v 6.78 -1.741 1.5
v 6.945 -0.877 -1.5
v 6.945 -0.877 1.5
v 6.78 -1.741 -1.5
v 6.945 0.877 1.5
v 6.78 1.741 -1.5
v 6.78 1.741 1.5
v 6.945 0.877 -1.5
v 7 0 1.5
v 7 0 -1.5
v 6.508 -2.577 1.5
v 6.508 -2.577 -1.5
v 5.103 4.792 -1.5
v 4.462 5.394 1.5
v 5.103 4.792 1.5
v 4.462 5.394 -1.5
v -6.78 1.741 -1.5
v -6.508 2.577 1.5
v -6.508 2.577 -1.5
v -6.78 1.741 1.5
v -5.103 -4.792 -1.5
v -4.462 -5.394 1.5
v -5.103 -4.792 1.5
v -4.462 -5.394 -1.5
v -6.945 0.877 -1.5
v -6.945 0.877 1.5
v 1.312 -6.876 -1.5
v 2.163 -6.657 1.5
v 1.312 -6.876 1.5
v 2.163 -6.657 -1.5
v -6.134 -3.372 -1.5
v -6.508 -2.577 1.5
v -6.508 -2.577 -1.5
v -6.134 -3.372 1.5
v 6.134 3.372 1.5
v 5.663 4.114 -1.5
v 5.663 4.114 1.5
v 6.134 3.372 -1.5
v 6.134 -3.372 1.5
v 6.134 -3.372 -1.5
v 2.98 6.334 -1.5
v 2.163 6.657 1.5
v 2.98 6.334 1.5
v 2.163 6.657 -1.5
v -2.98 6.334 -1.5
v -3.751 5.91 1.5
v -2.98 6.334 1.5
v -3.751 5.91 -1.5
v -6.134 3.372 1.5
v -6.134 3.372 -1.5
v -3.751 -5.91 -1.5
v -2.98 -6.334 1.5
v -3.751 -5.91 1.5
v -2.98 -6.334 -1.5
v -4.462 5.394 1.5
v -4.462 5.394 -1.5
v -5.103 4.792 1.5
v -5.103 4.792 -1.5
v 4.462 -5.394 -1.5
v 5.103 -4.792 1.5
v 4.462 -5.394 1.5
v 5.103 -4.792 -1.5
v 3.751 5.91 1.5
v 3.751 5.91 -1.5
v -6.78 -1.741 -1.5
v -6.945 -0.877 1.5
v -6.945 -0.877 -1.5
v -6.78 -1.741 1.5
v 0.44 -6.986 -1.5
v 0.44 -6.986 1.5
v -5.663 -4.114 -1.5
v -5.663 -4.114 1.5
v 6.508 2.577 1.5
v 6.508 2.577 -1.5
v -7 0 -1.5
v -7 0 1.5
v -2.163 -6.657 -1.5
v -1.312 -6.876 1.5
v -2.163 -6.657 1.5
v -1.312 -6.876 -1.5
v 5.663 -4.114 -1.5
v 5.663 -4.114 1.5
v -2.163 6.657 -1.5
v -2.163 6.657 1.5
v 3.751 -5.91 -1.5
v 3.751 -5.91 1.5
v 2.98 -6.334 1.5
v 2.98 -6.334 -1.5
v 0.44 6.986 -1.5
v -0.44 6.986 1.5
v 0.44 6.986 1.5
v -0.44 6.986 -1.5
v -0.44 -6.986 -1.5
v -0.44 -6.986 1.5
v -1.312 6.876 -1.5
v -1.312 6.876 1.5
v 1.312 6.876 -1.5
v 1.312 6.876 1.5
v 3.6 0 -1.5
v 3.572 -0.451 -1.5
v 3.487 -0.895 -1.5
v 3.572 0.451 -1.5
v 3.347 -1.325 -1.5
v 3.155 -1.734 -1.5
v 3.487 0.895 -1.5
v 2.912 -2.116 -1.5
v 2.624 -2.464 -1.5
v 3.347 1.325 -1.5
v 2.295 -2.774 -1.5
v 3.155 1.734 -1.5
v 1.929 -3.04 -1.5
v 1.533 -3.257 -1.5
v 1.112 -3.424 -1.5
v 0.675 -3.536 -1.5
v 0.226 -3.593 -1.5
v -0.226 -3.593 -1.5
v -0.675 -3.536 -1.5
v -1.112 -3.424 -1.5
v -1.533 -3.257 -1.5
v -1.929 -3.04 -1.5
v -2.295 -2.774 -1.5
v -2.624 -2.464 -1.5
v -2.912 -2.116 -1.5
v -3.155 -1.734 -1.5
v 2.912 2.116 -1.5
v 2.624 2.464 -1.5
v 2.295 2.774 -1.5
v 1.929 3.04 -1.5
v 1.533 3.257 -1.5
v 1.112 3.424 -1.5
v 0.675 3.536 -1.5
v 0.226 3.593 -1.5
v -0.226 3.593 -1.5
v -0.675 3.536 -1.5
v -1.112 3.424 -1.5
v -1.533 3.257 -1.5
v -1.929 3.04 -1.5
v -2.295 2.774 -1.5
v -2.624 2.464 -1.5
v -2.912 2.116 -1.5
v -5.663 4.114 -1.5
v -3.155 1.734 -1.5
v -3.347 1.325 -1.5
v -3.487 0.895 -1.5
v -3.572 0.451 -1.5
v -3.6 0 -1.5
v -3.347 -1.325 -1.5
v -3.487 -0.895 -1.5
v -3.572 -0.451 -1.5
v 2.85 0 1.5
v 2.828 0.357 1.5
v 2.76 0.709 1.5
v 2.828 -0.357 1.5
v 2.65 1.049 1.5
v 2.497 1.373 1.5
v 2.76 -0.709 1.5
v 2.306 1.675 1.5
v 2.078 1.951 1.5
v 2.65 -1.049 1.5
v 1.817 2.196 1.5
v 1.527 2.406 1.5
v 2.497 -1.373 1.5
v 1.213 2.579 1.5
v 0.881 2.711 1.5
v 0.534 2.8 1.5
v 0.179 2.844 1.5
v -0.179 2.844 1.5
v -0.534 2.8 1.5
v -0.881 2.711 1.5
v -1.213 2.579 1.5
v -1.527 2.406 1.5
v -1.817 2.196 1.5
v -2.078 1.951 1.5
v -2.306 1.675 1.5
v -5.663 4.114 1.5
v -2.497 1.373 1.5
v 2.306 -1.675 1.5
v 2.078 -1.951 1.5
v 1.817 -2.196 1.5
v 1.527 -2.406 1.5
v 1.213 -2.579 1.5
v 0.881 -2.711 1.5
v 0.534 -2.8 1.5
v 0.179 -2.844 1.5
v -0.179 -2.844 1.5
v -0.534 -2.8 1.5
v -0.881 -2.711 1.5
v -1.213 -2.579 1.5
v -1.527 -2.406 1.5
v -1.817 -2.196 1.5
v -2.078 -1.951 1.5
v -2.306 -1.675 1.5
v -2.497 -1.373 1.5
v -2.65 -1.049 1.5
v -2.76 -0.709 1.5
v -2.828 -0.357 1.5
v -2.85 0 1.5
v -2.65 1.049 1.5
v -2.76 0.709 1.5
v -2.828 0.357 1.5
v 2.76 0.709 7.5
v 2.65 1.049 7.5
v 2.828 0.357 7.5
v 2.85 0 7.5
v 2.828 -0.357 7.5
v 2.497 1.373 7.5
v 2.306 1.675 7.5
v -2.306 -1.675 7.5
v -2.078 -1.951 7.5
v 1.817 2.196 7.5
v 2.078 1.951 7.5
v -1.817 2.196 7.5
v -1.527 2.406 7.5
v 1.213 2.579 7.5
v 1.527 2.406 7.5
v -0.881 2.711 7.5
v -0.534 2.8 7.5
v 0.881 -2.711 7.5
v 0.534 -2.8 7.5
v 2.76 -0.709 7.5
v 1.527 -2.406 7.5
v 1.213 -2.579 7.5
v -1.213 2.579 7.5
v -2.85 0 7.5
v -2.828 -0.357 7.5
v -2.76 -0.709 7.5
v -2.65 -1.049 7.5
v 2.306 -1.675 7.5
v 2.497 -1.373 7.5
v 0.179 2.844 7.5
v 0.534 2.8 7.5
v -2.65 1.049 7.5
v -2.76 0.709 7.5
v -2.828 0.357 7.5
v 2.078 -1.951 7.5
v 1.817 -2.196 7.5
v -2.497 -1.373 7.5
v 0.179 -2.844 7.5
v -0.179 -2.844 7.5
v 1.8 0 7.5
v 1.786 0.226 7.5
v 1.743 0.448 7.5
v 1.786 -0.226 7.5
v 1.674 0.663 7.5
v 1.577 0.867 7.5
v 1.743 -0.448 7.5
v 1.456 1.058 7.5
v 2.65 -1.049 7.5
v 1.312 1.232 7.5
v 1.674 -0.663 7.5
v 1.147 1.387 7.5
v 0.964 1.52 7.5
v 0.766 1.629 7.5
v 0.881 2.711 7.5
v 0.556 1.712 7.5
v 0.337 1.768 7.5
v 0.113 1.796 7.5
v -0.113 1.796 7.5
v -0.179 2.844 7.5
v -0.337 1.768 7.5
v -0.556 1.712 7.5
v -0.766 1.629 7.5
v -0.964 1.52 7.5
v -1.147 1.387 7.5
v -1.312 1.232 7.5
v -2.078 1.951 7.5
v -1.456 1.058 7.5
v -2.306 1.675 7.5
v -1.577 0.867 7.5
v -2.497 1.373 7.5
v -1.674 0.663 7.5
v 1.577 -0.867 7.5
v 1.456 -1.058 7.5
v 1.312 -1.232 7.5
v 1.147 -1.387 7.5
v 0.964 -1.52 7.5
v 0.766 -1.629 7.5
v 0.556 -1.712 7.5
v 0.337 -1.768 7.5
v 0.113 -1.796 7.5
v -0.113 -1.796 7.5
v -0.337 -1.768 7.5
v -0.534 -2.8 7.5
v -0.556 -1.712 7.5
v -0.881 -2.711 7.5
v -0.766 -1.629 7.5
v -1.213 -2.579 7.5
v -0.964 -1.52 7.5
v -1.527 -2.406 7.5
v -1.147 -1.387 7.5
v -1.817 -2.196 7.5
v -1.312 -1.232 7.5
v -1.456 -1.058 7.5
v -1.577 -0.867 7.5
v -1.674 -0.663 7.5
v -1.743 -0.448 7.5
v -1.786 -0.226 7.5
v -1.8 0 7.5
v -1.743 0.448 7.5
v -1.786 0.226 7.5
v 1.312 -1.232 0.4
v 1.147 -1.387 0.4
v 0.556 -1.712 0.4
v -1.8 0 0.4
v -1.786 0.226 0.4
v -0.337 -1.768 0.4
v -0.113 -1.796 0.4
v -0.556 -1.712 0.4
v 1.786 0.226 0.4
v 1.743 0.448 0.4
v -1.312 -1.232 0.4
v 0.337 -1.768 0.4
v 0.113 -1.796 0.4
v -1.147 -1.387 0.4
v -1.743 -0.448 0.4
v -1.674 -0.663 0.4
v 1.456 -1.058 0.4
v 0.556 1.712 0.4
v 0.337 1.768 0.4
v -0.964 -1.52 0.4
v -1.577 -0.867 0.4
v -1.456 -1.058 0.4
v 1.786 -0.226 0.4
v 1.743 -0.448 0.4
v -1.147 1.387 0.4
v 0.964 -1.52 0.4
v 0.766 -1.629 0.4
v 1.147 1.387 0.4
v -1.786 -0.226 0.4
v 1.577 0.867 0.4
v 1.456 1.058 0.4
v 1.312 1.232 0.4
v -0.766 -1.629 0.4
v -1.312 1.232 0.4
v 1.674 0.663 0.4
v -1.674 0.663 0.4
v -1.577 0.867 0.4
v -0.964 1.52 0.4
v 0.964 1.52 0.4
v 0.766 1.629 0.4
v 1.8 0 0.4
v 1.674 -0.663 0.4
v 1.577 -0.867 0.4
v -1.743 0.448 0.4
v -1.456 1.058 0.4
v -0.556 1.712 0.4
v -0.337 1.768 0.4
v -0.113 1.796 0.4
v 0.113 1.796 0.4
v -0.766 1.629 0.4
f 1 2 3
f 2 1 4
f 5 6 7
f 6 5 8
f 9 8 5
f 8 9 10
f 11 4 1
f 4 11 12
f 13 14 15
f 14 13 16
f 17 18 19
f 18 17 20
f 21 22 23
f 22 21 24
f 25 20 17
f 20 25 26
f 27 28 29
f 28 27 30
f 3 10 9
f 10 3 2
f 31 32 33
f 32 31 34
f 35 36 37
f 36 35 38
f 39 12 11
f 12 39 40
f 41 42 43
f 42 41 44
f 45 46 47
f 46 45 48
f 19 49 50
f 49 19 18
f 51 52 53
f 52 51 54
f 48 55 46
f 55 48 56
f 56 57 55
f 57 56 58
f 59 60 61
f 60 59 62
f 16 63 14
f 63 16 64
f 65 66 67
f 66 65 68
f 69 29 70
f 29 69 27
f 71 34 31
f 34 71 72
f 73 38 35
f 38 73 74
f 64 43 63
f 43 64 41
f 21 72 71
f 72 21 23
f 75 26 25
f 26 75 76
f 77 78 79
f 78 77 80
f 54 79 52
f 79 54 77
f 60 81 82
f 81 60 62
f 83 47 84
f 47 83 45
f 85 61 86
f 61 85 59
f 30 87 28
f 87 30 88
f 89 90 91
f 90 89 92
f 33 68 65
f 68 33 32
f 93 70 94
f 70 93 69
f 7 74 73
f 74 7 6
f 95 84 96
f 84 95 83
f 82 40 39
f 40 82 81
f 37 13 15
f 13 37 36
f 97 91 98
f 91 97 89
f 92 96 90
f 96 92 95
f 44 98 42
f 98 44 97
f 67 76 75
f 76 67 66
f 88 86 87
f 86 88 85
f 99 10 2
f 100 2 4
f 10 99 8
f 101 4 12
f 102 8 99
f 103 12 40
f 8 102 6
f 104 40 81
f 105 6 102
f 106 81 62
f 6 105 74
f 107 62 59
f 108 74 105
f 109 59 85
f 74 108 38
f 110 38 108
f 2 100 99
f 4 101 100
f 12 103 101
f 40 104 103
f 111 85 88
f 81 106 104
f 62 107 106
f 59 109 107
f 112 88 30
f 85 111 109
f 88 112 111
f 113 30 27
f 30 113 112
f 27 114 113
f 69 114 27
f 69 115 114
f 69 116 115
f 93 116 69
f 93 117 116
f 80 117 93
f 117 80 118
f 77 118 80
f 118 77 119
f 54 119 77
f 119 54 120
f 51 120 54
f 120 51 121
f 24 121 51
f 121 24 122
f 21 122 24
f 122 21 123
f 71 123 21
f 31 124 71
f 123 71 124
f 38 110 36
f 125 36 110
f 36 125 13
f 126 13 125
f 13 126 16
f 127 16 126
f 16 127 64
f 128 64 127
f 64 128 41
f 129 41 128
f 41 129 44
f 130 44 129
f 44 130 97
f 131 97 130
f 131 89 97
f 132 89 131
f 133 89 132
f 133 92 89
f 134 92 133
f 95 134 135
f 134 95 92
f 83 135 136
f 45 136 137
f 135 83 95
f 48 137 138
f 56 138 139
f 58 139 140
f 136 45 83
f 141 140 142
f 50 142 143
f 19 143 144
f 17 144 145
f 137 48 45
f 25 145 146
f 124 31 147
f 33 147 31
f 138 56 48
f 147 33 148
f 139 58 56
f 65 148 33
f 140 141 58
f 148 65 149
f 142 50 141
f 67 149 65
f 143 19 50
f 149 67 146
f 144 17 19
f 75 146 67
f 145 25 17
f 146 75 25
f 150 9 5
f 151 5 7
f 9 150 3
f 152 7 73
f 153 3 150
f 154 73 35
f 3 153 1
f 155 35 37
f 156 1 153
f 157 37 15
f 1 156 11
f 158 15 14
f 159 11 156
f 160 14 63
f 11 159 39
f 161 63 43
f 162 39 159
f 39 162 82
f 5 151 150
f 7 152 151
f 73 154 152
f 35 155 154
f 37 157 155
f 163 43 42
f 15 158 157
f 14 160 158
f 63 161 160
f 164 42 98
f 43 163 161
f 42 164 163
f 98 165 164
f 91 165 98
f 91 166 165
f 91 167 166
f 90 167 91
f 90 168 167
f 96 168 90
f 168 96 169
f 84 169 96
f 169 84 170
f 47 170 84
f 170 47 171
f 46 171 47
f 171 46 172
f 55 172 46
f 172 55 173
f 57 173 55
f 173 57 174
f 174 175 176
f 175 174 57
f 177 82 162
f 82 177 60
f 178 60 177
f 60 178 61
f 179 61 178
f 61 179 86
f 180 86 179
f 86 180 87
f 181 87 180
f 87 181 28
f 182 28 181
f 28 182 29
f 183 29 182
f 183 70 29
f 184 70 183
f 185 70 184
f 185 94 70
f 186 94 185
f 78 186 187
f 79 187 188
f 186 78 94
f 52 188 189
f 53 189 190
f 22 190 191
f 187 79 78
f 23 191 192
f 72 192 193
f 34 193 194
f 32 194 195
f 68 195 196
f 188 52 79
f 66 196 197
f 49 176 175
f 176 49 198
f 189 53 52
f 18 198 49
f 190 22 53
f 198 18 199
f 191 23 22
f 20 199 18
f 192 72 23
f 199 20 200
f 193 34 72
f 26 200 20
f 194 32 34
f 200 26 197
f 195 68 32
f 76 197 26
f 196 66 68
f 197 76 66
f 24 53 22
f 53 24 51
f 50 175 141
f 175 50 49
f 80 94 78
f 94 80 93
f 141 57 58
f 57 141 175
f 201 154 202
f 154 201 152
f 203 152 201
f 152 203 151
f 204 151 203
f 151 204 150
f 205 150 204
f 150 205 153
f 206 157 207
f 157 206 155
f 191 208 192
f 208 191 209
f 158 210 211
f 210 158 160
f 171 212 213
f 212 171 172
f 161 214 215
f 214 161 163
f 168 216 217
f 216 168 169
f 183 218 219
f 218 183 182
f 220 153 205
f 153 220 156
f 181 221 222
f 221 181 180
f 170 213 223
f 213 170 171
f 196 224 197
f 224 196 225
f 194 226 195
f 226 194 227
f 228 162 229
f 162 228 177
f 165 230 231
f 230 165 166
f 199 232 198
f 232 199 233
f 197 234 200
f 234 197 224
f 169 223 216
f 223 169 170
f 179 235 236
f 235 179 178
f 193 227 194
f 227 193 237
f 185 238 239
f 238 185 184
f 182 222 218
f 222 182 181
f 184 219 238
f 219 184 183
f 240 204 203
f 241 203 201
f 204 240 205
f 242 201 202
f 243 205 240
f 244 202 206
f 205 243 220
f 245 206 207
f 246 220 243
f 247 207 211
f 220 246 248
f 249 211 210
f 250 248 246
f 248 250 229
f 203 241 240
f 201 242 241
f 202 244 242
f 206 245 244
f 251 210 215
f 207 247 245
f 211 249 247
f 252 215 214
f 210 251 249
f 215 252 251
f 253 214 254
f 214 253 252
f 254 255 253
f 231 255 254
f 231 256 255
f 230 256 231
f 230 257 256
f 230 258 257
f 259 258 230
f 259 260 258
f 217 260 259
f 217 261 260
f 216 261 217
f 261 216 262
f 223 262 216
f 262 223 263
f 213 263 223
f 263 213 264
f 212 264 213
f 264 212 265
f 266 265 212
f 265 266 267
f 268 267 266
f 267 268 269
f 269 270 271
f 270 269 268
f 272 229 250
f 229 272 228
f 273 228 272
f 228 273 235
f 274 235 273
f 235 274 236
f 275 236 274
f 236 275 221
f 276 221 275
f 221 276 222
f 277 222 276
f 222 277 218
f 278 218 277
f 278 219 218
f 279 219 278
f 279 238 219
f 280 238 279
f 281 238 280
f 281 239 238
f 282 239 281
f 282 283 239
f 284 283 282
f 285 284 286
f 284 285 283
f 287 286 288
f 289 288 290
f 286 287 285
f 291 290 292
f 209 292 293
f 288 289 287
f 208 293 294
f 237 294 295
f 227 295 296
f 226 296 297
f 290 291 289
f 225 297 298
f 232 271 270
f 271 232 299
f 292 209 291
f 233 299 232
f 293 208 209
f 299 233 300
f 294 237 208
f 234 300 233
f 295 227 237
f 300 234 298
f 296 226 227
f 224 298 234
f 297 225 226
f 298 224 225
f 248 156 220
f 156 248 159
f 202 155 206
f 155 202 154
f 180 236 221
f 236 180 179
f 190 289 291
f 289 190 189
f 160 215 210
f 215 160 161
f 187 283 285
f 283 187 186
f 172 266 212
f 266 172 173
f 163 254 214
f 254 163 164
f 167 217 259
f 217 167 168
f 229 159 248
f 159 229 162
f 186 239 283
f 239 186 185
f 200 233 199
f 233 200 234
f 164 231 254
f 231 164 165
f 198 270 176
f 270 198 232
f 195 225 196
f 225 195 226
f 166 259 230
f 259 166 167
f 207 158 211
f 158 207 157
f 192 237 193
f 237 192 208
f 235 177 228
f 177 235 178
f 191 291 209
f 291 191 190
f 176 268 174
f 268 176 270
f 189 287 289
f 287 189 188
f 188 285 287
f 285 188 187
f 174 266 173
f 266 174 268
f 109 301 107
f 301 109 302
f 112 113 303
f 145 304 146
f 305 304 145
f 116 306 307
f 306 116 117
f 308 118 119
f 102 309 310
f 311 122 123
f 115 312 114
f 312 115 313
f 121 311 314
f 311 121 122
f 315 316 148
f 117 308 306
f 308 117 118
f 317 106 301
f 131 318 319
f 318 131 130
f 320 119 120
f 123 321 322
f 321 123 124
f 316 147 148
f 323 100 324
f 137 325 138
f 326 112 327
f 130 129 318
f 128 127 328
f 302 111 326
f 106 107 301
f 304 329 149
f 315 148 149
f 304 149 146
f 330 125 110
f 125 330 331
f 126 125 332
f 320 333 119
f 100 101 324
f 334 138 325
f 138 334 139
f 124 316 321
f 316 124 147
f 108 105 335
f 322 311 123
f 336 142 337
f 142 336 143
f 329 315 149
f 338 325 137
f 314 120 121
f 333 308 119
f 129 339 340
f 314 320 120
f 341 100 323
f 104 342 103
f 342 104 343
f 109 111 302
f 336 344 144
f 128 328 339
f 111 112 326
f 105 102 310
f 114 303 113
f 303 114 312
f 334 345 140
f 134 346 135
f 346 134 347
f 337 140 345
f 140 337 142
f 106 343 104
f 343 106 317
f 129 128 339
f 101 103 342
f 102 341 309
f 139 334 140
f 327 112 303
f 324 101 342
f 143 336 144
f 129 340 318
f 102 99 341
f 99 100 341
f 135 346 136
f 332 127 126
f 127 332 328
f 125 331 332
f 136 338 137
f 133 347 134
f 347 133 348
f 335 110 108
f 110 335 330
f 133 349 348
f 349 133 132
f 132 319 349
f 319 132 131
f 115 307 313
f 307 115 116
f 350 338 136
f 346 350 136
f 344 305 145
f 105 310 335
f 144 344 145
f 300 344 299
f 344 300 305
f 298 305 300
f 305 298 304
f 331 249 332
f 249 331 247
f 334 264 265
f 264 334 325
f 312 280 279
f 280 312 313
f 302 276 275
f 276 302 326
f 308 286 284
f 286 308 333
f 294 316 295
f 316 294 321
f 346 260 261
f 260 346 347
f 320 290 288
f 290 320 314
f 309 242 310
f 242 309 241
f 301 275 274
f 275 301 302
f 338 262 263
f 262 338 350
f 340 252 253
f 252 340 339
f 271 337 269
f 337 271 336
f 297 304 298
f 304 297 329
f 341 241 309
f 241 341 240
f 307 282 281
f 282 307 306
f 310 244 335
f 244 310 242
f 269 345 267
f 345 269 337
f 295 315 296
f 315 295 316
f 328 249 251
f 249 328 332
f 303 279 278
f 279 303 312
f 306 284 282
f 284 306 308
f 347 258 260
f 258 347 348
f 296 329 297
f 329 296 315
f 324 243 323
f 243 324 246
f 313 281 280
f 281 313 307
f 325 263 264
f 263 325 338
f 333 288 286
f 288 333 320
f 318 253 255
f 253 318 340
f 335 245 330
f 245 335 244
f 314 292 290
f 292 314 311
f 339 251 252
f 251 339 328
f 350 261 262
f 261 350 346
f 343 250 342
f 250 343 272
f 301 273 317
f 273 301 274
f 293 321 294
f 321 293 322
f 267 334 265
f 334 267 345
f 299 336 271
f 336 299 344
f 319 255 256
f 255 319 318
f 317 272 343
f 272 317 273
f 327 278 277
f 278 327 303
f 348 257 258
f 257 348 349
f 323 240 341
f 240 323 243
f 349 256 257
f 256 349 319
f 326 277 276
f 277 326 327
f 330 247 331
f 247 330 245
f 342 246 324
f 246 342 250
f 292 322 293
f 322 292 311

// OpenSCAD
$fn = 50;


difference() {
	union() {
		translate(v = [0, 0, -1.5000000000]) {
			cylinder(h = 3, r = 7.0000000000);
		}
		translate(v = [0, 0, -1.5000000000]) {
			cylinder(h = 9, r = 2.8500000000);
		}
	}
	union() {
		translate(v = [0, 0, -1.5000000000]) {
			rotate(a = [0, 180, 0]) {
				difference() {
					union() {
						translate(v = [0, 0, -9.0000000000]) {
							cylinder(h = 9, r = 1.5000000000);
						}
						translate(v = [0, 0, -1.9000000000]) {
							cylinder(h = 1.9000000000, r1 = 1.8000000000, r2 = 3.6000000000);
						}
						translate(v = [0, 0, -9.0000000000]) {
							cylinder(h = 9, r = 1.8000000000);
						}
						translate(v = [0, 0, -9.0000000000]) {
							cylinder(h = 9, r = 1.5000000000);
						}
					}
					union();
				}
			}
		}
		translate(v = [0, 0, -100.0000000000]) {
			cylinder(h = 200, r = 1.8000000000);
		}
	}
}
